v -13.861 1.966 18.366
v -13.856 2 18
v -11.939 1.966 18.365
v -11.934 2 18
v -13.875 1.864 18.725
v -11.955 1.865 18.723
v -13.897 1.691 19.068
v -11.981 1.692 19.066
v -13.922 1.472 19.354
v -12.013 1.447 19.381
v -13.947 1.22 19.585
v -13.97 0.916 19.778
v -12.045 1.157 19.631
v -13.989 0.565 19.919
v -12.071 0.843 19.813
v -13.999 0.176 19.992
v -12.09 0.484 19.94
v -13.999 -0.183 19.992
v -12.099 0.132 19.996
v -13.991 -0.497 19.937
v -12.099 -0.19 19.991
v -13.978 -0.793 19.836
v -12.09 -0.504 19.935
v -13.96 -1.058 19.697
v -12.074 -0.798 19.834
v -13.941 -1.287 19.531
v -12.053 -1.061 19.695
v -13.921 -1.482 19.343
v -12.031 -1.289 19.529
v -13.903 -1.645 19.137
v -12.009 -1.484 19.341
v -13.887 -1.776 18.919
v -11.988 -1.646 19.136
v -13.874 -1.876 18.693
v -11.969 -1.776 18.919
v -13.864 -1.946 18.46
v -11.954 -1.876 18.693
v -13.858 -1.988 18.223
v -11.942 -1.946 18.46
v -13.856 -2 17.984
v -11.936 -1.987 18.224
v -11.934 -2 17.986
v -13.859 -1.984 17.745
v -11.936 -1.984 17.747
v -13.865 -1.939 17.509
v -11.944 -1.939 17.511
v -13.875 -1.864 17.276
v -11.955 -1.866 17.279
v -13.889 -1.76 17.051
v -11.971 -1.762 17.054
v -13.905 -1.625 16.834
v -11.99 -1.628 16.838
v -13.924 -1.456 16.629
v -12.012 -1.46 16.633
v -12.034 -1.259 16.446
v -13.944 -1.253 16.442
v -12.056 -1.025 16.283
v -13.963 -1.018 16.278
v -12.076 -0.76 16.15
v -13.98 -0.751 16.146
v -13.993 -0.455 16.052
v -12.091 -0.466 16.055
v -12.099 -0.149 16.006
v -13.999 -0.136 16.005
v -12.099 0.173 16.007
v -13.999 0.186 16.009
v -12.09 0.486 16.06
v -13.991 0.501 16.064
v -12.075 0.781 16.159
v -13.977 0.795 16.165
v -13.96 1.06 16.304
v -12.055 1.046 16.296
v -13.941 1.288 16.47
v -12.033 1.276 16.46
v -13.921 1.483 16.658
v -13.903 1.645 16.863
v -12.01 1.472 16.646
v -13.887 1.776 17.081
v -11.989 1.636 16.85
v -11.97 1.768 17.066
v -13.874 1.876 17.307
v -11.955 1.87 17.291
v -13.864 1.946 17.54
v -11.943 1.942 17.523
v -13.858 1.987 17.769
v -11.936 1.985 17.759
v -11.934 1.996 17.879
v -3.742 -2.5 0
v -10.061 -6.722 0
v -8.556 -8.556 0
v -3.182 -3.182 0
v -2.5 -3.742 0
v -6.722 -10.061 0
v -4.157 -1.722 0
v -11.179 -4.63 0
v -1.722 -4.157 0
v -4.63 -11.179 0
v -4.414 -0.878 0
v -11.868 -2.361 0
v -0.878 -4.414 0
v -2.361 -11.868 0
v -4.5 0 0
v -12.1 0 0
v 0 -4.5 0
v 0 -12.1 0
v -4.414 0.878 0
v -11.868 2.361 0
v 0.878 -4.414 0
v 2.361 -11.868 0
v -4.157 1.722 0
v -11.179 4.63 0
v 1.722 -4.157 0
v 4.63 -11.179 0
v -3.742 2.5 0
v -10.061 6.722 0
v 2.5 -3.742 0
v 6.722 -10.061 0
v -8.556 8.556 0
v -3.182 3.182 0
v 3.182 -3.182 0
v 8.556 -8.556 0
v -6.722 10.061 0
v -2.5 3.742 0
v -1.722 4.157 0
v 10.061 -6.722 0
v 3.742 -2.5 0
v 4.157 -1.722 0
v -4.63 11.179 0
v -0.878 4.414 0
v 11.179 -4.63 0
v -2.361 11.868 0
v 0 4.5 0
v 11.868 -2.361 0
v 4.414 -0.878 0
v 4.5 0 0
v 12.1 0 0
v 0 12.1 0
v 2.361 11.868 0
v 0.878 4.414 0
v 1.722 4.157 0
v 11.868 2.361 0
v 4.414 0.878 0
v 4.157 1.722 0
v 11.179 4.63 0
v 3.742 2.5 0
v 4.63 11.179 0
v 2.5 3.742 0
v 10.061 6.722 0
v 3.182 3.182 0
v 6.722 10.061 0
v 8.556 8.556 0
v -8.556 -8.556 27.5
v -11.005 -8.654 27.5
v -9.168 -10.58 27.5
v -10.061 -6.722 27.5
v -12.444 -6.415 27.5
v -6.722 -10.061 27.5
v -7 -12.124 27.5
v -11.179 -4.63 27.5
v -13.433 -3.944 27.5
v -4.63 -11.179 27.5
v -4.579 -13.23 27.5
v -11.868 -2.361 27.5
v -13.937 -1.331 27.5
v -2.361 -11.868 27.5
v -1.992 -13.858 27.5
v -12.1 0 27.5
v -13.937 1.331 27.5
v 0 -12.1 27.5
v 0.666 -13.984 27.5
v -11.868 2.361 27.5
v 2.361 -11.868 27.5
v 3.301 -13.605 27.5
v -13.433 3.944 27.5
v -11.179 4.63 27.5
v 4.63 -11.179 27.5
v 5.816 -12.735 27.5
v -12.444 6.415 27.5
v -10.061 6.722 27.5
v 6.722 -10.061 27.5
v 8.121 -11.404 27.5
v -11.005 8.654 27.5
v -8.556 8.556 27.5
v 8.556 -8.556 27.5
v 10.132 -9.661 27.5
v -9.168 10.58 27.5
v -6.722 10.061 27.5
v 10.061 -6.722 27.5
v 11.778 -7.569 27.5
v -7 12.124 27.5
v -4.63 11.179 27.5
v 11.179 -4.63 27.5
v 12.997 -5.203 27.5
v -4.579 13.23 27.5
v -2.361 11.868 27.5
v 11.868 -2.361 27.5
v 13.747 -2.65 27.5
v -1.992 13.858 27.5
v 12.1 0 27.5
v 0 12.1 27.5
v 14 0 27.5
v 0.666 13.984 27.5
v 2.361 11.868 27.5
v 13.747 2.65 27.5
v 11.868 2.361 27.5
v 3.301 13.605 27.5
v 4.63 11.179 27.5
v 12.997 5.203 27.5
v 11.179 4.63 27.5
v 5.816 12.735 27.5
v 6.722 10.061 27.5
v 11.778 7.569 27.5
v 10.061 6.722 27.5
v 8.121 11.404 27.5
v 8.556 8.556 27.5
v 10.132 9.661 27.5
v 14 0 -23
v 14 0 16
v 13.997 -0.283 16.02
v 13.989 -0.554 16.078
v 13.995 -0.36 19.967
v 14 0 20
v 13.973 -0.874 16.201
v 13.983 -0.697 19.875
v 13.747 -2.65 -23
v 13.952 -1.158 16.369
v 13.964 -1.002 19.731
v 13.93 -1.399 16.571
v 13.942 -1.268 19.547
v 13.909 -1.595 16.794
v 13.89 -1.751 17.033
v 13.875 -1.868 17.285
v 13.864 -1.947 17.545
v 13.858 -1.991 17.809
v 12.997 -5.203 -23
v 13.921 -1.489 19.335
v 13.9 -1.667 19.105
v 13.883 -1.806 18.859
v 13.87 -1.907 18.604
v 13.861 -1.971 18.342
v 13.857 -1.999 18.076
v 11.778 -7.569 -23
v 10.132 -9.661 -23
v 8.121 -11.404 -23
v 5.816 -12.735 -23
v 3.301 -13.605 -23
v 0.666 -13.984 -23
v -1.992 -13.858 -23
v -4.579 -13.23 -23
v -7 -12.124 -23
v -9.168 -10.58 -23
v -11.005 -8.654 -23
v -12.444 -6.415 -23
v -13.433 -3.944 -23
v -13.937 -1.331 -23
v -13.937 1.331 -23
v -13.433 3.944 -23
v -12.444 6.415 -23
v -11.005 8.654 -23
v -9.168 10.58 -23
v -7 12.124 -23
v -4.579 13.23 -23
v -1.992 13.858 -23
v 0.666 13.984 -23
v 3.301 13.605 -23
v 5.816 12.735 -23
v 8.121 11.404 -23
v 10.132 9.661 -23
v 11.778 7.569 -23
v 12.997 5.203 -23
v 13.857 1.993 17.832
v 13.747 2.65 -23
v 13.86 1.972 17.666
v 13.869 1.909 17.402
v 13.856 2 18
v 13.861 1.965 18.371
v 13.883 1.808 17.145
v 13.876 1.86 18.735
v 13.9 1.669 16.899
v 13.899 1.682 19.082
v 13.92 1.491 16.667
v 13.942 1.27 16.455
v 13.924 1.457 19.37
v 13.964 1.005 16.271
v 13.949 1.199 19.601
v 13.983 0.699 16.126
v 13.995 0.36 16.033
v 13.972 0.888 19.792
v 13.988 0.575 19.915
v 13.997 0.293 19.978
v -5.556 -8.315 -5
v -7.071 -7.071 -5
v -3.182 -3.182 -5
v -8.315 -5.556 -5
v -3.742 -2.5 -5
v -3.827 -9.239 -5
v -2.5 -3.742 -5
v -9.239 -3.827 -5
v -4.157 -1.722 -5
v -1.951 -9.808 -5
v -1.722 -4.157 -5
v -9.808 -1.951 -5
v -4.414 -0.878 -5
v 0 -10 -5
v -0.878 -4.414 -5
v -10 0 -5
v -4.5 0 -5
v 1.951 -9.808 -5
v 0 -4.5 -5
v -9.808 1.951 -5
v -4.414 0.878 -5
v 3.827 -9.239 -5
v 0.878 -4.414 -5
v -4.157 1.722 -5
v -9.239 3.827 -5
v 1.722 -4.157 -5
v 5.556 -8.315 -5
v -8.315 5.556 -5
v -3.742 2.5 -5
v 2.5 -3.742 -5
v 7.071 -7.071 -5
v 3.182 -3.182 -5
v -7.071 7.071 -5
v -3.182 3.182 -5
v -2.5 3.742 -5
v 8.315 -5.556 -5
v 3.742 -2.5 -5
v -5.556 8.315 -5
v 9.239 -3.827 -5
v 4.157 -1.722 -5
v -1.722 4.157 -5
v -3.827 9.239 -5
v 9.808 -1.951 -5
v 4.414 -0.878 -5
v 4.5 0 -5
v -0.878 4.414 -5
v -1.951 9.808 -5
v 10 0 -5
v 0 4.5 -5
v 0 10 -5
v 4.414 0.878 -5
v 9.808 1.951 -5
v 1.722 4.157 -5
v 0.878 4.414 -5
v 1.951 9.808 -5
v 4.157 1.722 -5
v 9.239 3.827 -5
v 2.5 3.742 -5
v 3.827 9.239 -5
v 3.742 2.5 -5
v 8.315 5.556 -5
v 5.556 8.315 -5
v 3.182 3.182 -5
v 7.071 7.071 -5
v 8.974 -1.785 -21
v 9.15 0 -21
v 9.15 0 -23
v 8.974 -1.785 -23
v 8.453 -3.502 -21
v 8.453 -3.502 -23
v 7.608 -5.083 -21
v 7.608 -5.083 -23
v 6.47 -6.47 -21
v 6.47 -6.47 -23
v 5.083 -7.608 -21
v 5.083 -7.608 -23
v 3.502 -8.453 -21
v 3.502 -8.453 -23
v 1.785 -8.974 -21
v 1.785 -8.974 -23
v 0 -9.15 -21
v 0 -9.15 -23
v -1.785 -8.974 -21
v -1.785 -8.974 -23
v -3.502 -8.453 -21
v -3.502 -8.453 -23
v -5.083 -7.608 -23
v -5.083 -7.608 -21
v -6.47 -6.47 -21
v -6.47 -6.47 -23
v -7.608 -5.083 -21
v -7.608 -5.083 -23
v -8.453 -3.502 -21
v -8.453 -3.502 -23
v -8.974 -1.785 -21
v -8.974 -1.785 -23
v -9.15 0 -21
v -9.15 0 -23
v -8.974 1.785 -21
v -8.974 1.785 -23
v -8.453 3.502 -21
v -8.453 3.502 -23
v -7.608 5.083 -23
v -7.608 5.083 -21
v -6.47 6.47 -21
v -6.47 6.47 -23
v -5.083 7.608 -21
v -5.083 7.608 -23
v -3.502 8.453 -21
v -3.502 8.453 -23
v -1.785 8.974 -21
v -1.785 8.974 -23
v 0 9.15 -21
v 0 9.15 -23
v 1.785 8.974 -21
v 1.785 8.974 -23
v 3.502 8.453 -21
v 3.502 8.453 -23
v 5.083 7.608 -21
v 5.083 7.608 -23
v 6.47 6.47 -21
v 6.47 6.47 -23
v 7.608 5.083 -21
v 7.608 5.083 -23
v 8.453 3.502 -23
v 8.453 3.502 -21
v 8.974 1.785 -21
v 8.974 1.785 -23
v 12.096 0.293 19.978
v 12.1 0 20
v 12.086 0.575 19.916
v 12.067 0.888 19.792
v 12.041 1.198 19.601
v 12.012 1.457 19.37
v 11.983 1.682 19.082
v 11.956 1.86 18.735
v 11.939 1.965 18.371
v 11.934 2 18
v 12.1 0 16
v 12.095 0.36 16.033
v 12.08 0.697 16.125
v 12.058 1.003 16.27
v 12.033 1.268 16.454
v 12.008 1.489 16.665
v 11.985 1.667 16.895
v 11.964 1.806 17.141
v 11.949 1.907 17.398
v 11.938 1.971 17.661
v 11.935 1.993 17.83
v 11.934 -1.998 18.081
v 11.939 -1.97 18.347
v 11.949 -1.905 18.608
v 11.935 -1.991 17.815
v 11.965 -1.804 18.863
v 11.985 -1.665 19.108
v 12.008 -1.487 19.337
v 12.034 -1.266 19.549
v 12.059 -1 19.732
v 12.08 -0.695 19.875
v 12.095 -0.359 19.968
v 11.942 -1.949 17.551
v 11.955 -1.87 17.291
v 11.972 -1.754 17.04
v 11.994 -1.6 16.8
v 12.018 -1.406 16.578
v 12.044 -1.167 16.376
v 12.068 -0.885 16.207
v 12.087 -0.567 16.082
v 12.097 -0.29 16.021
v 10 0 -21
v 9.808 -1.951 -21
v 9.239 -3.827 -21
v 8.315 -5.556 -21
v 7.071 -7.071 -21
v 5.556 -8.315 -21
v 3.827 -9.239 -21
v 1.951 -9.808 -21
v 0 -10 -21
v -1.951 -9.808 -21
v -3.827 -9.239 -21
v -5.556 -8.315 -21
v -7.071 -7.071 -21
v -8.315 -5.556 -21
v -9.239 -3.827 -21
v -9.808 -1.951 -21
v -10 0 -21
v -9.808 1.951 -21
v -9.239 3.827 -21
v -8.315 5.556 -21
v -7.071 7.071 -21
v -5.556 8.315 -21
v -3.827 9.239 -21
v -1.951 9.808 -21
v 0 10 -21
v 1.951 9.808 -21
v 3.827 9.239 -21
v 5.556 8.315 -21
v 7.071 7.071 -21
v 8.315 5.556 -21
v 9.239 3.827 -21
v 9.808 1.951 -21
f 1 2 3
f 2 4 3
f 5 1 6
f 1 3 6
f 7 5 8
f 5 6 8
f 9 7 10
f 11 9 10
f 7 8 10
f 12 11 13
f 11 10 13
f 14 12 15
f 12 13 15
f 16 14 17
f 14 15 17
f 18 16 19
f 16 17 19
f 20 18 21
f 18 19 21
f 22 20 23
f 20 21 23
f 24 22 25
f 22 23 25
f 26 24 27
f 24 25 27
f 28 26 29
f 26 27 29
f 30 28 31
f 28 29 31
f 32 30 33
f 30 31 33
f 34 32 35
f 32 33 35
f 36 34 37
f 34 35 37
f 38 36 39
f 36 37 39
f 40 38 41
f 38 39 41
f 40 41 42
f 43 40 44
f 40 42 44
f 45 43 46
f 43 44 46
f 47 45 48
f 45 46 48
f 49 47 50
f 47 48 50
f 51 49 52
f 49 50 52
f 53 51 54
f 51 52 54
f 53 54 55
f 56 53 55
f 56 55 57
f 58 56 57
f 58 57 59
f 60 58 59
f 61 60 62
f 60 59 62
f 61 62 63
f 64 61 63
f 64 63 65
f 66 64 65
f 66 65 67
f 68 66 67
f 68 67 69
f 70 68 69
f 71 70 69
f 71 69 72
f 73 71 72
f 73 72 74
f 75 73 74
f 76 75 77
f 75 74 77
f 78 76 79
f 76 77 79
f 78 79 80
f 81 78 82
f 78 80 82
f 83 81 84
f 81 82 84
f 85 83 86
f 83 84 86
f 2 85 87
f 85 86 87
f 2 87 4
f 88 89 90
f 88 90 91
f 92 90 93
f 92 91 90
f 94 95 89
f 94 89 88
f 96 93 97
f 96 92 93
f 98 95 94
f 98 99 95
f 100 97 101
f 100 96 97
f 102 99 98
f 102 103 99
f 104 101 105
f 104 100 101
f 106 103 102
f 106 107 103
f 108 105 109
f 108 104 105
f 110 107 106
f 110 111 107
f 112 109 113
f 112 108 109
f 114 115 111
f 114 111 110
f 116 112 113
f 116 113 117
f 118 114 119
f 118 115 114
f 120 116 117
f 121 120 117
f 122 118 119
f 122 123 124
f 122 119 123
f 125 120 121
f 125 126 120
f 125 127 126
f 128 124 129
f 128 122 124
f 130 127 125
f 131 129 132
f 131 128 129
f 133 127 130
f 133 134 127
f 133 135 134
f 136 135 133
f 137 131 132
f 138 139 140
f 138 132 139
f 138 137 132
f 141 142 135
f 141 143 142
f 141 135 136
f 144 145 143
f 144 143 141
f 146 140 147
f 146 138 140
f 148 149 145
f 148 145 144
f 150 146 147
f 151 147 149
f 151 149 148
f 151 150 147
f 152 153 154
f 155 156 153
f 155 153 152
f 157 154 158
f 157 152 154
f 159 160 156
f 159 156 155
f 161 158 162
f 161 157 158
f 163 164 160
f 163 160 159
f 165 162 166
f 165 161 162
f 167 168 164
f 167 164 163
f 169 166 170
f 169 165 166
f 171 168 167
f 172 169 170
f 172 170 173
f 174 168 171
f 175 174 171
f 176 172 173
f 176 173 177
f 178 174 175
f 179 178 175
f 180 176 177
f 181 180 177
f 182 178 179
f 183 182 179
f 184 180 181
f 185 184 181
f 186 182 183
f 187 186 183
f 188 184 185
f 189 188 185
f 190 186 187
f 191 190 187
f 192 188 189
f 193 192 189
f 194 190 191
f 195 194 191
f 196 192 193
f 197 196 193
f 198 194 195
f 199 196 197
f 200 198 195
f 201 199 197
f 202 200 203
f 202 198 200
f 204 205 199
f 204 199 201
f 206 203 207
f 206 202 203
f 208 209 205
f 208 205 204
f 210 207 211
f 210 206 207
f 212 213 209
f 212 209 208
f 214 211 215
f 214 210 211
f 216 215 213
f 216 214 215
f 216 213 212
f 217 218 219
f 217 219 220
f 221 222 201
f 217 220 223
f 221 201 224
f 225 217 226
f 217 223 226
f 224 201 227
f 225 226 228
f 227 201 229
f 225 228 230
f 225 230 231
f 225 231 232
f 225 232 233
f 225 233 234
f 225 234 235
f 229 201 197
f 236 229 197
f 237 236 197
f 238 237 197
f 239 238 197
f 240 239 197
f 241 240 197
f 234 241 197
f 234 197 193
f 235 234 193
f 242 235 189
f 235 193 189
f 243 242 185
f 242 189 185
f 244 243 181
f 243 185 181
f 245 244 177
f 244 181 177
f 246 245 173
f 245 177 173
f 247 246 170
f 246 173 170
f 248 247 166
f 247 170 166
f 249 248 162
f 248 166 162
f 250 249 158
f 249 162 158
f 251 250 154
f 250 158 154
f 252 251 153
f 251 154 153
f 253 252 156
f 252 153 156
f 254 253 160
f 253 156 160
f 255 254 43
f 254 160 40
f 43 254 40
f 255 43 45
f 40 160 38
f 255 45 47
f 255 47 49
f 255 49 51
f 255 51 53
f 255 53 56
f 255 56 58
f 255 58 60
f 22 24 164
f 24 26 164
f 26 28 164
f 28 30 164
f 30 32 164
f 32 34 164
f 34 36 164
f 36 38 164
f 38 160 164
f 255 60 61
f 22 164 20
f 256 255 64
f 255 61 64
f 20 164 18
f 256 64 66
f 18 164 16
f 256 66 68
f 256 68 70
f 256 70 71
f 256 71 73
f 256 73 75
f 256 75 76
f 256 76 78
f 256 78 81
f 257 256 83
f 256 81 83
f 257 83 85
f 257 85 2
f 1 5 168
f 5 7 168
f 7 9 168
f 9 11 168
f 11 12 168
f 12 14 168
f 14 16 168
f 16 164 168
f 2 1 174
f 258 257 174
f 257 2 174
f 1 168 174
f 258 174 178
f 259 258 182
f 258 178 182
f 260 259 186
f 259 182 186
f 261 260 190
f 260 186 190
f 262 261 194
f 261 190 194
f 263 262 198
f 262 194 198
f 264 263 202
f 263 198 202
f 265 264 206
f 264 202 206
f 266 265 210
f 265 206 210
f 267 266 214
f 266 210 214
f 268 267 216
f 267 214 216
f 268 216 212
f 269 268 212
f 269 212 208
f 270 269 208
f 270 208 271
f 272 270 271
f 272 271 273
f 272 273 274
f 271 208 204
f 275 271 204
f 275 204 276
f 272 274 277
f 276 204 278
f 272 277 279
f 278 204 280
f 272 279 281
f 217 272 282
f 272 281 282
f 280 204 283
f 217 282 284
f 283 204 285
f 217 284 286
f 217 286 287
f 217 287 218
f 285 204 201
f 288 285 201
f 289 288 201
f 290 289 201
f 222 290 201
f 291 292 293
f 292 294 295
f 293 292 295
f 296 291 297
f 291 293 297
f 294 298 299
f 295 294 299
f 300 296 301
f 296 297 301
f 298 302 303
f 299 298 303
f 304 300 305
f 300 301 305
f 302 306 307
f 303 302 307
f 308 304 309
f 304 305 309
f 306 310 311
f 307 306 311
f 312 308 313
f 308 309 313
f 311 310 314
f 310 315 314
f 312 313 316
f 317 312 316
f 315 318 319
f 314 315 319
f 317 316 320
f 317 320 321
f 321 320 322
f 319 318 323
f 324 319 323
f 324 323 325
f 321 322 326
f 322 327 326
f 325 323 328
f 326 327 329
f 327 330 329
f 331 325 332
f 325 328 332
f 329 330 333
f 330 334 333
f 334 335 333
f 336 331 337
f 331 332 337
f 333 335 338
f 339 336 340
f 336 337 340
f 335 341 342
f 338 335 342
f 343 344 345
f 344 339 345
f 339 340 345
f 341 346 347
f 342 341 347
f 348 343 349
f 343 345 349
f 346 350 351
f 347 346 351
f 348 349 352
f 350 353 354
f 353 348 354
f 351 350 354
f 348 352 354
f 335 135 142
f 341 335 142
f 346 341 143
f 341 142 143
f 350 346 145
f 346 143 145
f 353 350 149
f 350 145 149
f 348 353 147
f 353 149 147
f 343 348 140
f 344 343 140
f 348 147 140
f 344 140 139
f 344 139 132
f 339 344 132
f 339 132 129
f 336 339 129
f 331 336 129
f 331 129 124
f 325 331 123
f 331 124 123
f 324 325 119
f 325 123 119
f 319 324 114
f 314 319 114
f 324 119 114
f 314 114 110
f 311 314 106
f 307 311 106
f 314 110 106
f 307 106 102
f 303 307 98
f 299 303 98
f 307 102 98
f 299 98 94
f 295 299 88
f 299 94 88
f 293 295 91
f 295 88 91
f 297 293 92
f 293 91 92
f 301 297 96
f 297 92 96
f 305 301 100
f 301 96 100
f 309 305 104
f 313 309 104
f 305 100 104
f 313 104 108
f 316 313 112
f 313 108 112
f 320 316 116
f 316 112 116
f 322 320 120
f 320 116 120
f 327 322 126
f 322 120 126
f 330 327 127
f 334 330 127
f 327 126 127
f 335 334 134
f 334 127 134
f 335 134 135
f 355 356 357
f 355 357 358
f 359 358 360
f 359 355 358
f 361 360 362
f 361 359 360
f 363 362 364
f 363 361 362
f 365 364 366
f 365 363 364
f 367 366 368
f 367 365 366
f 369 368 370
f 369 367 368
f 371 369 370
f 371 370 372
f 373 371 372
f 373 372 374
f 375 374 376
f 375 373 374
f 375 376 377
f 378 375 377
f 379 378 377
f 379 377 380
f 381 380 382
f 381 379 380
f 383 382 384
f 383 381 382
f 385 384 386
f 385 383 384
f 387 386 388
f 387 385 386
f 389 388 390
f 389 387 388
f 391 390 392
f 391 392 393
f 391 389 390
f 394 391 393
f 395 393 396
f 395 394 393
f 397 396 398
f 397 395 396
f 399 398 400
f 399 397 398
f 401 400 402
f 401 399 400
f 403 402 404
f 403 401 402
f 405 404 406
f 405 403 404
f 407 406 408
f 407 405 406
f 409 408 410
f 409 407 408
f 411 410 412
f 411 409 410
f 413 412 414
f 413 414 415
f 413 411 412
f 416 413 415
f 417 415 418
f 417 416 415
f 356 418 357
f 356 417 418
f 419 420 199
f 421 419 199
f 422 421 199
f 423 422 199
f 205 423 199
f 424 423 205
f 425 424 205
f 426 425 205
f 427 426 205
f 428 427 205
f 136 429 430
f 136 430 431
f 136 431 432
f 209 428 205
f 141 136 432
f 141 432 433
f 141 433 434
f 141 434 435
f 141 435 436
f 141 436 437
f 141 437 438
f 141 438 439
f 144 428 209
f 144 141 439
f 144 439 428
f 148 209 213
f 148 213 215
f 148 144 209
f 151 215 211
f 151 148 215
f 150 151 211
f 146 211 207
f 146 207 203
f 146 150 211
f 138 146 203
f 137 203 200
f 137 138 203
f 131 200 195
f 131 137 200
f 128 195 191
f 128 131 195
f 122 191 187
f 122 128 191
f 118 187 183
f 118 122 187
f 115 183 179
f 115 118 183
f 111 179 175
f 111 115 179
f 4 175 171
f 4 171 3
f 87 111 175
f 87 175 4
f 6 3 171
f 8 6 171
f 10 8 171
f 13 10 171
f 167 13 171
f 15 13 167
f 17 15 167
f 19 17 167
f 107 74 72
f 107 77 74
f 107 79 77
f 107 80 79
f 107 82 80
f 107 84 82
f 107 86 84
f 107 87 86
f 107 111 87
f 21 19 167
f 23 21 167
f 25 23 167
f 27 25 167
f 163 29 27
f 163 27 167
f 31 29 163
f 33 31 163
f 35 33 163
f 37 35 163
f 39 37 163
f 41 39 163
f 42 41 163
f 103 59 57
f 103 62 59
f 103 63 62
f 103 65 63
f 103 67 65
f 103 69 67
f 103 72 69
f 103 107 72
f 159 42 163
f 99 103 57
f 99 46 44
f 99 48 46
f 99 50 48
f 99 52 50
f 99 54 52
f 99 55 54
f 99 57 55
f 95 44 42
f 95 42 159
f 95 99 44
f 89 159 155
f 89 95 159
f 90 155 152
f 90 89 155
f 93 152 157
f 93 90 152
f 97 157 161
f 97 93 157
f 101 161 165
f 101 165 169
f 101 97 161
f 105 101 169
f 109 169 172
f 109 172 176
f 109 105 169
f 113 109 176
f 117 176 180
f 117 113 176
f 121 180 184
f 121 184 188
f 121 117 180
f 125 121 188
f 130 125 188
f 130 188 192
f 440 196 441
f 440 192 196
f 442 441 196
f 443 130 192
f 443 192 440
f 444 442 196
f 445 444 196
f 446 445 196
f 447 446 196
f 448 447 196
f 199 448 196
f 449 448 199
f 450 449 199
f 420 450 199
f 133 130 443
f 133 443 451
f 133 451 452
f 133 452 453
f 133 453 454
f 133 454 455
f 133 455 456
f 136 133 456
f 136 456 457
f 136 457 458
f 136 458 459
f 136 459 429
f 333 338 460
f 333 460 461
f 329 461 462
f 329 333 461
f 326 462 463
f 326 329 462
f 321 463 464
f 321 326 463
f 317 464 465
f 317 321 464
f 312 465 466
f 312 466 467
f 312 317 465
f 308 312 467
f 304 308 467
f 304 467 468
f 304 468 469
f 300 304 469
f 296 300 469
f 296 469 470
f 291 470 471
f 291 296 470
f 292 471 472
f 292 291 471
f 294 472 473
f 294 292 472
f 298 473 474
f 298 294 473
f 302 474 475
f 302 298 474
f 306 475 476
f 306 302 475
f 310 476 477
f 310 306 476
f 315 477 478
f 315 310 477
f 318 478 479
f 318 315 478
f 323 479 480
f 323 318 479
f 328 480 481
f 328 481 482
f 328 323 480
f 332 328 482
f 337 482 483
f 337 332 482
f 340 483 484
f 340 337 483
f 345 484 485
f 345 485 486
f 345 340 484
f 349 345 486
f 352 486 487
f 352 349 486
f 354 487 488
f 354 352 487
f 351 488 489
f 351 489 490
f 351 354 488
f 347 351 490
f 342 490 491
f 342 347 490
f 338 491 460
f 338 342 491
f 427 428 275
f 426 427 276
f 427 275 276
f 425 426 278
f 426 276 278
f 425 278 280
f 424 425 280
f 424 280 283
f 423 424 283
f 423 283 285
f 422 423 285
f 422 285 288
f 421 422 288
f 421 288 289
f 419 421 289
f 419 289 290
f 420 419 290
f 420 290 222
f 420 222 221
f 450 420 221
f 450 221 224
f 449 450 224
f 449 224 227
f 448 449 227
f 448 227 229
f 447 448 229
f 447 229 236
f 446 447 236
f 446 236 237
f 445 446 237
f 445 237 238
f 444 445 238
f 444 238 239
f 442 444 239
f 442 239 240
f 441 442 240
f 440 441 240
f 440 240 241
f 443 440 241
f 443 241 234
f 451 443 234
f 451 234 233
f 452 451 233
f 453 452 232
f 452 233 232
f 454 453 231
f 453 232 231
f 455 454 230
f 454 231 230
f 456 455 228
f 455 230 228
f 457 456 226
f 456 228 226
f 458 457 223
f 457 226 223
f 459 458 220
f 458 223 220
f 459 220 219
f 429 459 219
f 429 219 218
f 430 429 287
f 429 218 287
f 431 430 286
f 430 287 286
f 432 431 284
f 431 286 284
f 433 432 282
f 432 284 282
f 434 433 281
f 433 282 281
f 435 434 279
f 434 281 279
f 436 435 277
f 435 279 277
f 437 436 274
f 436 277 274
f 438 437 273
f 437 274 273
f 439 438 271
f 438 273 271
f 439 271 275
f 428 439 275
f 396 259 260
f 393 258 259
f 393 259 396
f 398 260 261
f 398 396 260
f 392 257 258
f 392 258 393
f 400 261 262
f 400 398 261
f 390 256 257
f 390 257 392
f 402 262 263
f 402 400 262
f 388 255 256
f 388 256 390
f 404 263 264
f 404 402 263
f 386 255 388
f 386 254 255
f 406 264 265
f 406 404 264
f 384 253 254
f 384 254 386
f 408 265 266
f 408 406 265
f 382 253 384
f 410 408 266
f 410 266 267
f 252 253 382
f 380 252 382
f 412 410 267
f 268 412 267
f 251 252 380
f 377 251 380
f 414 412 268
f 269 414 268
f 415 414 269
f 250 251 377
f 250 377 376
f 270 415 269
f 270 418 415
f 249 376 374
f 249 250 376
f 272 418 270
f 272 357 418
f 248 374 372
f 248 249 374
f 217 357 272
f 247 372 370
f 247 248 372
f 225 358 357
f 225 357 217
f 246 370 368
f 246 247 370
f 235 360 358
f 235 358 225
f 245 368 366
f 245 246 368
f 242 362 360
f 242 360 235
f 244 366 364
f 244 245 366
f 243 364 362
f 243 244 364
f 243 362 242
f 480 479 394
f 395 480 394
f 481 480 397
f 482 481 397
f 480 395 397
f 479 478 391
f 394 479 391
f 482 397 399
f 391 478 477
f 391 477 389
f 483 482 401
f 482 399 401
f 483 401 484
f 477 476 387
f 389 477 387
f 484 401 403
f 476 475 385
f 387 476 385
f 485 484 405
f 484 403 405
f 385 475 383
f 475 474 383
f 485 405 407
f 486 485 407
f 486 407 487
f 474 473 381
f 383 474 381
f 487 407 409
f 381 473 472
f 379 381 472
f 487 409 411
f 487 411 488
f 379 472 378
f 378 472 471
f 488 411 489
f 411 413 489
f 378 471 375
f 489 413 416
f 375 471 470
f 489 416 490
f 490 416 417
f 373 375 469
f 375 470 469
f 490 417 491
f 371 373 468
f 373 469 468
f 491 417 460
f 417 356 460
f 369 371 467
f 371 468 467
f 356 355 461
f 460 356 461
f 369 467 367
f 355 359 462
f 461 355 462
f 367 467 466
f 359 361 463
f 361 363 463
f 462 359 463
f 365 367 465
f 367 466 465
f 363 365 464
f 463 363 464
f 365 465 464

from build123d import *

# Parameters (mm, degrees)
F0_R     = 14
F0_R_2   = 12.1
F1_DEPTH = 27.5
F2_R     = 14
F2_R_2   = 4.5
F3_DEPTH = 5
F4_R     = 14
F4_R_2   = 10
F5_DEPTH = 16
F6_R     = 14
F6_R_2   = 9.15
F7_DEPTH = 2
F8_R     = 2
F9_DEPTH = 20


with BuildPart() as f1:
    # F0 (on Top) → F1 (new body)
    with BuildSketch(Plane.XY):
        Circle(F0_R)
        Circle(F0_R_2, mode=Mode.SUBTRACT)
    extrude(amount=F1_DEPTH)

    # F2 (on Top) → F3 (join)
    with BuildSketch(Plane.XY):
        Circle(F2_R)
        Circle(F2_R_2, mode=Mode.SUBTRACT)
    extrude(amount=-F3_DEPTH)

    # F4 (on face) → F5 (join)
    with BuildSketch(Plane(origin=(0, 0, -5), x_dir=(1, 0, 0), z_dir=(0, 0, -1))):
        Circle(F4_R)
        Circle(F4_R_2, mode=Mode.SUBTRACT)
    extrude(amount=F5_DEPTH)

    # F6 (on face) → F7 (join)
    with BuildSketch(Plane(origin=(0, 0, -21), x_dir=(1, 0, 0), z_dir=(0, 0, -1))):
        Circle(F6_R)
        Circle(F6_R_2, mode=Mode.SUBTRACT)
    extrude(amount=F7_DEPTH)

    # F8 (on Right) → F9 (cut, symmetric)
    with BuildSketch(Plane.YZ):
        with Locations((0, 18)):
            Circle(F8_R)
    extrude(amount=F9_DEPTH, both=True, mode=Mode.SUBTRACT)


solid = f1.part
